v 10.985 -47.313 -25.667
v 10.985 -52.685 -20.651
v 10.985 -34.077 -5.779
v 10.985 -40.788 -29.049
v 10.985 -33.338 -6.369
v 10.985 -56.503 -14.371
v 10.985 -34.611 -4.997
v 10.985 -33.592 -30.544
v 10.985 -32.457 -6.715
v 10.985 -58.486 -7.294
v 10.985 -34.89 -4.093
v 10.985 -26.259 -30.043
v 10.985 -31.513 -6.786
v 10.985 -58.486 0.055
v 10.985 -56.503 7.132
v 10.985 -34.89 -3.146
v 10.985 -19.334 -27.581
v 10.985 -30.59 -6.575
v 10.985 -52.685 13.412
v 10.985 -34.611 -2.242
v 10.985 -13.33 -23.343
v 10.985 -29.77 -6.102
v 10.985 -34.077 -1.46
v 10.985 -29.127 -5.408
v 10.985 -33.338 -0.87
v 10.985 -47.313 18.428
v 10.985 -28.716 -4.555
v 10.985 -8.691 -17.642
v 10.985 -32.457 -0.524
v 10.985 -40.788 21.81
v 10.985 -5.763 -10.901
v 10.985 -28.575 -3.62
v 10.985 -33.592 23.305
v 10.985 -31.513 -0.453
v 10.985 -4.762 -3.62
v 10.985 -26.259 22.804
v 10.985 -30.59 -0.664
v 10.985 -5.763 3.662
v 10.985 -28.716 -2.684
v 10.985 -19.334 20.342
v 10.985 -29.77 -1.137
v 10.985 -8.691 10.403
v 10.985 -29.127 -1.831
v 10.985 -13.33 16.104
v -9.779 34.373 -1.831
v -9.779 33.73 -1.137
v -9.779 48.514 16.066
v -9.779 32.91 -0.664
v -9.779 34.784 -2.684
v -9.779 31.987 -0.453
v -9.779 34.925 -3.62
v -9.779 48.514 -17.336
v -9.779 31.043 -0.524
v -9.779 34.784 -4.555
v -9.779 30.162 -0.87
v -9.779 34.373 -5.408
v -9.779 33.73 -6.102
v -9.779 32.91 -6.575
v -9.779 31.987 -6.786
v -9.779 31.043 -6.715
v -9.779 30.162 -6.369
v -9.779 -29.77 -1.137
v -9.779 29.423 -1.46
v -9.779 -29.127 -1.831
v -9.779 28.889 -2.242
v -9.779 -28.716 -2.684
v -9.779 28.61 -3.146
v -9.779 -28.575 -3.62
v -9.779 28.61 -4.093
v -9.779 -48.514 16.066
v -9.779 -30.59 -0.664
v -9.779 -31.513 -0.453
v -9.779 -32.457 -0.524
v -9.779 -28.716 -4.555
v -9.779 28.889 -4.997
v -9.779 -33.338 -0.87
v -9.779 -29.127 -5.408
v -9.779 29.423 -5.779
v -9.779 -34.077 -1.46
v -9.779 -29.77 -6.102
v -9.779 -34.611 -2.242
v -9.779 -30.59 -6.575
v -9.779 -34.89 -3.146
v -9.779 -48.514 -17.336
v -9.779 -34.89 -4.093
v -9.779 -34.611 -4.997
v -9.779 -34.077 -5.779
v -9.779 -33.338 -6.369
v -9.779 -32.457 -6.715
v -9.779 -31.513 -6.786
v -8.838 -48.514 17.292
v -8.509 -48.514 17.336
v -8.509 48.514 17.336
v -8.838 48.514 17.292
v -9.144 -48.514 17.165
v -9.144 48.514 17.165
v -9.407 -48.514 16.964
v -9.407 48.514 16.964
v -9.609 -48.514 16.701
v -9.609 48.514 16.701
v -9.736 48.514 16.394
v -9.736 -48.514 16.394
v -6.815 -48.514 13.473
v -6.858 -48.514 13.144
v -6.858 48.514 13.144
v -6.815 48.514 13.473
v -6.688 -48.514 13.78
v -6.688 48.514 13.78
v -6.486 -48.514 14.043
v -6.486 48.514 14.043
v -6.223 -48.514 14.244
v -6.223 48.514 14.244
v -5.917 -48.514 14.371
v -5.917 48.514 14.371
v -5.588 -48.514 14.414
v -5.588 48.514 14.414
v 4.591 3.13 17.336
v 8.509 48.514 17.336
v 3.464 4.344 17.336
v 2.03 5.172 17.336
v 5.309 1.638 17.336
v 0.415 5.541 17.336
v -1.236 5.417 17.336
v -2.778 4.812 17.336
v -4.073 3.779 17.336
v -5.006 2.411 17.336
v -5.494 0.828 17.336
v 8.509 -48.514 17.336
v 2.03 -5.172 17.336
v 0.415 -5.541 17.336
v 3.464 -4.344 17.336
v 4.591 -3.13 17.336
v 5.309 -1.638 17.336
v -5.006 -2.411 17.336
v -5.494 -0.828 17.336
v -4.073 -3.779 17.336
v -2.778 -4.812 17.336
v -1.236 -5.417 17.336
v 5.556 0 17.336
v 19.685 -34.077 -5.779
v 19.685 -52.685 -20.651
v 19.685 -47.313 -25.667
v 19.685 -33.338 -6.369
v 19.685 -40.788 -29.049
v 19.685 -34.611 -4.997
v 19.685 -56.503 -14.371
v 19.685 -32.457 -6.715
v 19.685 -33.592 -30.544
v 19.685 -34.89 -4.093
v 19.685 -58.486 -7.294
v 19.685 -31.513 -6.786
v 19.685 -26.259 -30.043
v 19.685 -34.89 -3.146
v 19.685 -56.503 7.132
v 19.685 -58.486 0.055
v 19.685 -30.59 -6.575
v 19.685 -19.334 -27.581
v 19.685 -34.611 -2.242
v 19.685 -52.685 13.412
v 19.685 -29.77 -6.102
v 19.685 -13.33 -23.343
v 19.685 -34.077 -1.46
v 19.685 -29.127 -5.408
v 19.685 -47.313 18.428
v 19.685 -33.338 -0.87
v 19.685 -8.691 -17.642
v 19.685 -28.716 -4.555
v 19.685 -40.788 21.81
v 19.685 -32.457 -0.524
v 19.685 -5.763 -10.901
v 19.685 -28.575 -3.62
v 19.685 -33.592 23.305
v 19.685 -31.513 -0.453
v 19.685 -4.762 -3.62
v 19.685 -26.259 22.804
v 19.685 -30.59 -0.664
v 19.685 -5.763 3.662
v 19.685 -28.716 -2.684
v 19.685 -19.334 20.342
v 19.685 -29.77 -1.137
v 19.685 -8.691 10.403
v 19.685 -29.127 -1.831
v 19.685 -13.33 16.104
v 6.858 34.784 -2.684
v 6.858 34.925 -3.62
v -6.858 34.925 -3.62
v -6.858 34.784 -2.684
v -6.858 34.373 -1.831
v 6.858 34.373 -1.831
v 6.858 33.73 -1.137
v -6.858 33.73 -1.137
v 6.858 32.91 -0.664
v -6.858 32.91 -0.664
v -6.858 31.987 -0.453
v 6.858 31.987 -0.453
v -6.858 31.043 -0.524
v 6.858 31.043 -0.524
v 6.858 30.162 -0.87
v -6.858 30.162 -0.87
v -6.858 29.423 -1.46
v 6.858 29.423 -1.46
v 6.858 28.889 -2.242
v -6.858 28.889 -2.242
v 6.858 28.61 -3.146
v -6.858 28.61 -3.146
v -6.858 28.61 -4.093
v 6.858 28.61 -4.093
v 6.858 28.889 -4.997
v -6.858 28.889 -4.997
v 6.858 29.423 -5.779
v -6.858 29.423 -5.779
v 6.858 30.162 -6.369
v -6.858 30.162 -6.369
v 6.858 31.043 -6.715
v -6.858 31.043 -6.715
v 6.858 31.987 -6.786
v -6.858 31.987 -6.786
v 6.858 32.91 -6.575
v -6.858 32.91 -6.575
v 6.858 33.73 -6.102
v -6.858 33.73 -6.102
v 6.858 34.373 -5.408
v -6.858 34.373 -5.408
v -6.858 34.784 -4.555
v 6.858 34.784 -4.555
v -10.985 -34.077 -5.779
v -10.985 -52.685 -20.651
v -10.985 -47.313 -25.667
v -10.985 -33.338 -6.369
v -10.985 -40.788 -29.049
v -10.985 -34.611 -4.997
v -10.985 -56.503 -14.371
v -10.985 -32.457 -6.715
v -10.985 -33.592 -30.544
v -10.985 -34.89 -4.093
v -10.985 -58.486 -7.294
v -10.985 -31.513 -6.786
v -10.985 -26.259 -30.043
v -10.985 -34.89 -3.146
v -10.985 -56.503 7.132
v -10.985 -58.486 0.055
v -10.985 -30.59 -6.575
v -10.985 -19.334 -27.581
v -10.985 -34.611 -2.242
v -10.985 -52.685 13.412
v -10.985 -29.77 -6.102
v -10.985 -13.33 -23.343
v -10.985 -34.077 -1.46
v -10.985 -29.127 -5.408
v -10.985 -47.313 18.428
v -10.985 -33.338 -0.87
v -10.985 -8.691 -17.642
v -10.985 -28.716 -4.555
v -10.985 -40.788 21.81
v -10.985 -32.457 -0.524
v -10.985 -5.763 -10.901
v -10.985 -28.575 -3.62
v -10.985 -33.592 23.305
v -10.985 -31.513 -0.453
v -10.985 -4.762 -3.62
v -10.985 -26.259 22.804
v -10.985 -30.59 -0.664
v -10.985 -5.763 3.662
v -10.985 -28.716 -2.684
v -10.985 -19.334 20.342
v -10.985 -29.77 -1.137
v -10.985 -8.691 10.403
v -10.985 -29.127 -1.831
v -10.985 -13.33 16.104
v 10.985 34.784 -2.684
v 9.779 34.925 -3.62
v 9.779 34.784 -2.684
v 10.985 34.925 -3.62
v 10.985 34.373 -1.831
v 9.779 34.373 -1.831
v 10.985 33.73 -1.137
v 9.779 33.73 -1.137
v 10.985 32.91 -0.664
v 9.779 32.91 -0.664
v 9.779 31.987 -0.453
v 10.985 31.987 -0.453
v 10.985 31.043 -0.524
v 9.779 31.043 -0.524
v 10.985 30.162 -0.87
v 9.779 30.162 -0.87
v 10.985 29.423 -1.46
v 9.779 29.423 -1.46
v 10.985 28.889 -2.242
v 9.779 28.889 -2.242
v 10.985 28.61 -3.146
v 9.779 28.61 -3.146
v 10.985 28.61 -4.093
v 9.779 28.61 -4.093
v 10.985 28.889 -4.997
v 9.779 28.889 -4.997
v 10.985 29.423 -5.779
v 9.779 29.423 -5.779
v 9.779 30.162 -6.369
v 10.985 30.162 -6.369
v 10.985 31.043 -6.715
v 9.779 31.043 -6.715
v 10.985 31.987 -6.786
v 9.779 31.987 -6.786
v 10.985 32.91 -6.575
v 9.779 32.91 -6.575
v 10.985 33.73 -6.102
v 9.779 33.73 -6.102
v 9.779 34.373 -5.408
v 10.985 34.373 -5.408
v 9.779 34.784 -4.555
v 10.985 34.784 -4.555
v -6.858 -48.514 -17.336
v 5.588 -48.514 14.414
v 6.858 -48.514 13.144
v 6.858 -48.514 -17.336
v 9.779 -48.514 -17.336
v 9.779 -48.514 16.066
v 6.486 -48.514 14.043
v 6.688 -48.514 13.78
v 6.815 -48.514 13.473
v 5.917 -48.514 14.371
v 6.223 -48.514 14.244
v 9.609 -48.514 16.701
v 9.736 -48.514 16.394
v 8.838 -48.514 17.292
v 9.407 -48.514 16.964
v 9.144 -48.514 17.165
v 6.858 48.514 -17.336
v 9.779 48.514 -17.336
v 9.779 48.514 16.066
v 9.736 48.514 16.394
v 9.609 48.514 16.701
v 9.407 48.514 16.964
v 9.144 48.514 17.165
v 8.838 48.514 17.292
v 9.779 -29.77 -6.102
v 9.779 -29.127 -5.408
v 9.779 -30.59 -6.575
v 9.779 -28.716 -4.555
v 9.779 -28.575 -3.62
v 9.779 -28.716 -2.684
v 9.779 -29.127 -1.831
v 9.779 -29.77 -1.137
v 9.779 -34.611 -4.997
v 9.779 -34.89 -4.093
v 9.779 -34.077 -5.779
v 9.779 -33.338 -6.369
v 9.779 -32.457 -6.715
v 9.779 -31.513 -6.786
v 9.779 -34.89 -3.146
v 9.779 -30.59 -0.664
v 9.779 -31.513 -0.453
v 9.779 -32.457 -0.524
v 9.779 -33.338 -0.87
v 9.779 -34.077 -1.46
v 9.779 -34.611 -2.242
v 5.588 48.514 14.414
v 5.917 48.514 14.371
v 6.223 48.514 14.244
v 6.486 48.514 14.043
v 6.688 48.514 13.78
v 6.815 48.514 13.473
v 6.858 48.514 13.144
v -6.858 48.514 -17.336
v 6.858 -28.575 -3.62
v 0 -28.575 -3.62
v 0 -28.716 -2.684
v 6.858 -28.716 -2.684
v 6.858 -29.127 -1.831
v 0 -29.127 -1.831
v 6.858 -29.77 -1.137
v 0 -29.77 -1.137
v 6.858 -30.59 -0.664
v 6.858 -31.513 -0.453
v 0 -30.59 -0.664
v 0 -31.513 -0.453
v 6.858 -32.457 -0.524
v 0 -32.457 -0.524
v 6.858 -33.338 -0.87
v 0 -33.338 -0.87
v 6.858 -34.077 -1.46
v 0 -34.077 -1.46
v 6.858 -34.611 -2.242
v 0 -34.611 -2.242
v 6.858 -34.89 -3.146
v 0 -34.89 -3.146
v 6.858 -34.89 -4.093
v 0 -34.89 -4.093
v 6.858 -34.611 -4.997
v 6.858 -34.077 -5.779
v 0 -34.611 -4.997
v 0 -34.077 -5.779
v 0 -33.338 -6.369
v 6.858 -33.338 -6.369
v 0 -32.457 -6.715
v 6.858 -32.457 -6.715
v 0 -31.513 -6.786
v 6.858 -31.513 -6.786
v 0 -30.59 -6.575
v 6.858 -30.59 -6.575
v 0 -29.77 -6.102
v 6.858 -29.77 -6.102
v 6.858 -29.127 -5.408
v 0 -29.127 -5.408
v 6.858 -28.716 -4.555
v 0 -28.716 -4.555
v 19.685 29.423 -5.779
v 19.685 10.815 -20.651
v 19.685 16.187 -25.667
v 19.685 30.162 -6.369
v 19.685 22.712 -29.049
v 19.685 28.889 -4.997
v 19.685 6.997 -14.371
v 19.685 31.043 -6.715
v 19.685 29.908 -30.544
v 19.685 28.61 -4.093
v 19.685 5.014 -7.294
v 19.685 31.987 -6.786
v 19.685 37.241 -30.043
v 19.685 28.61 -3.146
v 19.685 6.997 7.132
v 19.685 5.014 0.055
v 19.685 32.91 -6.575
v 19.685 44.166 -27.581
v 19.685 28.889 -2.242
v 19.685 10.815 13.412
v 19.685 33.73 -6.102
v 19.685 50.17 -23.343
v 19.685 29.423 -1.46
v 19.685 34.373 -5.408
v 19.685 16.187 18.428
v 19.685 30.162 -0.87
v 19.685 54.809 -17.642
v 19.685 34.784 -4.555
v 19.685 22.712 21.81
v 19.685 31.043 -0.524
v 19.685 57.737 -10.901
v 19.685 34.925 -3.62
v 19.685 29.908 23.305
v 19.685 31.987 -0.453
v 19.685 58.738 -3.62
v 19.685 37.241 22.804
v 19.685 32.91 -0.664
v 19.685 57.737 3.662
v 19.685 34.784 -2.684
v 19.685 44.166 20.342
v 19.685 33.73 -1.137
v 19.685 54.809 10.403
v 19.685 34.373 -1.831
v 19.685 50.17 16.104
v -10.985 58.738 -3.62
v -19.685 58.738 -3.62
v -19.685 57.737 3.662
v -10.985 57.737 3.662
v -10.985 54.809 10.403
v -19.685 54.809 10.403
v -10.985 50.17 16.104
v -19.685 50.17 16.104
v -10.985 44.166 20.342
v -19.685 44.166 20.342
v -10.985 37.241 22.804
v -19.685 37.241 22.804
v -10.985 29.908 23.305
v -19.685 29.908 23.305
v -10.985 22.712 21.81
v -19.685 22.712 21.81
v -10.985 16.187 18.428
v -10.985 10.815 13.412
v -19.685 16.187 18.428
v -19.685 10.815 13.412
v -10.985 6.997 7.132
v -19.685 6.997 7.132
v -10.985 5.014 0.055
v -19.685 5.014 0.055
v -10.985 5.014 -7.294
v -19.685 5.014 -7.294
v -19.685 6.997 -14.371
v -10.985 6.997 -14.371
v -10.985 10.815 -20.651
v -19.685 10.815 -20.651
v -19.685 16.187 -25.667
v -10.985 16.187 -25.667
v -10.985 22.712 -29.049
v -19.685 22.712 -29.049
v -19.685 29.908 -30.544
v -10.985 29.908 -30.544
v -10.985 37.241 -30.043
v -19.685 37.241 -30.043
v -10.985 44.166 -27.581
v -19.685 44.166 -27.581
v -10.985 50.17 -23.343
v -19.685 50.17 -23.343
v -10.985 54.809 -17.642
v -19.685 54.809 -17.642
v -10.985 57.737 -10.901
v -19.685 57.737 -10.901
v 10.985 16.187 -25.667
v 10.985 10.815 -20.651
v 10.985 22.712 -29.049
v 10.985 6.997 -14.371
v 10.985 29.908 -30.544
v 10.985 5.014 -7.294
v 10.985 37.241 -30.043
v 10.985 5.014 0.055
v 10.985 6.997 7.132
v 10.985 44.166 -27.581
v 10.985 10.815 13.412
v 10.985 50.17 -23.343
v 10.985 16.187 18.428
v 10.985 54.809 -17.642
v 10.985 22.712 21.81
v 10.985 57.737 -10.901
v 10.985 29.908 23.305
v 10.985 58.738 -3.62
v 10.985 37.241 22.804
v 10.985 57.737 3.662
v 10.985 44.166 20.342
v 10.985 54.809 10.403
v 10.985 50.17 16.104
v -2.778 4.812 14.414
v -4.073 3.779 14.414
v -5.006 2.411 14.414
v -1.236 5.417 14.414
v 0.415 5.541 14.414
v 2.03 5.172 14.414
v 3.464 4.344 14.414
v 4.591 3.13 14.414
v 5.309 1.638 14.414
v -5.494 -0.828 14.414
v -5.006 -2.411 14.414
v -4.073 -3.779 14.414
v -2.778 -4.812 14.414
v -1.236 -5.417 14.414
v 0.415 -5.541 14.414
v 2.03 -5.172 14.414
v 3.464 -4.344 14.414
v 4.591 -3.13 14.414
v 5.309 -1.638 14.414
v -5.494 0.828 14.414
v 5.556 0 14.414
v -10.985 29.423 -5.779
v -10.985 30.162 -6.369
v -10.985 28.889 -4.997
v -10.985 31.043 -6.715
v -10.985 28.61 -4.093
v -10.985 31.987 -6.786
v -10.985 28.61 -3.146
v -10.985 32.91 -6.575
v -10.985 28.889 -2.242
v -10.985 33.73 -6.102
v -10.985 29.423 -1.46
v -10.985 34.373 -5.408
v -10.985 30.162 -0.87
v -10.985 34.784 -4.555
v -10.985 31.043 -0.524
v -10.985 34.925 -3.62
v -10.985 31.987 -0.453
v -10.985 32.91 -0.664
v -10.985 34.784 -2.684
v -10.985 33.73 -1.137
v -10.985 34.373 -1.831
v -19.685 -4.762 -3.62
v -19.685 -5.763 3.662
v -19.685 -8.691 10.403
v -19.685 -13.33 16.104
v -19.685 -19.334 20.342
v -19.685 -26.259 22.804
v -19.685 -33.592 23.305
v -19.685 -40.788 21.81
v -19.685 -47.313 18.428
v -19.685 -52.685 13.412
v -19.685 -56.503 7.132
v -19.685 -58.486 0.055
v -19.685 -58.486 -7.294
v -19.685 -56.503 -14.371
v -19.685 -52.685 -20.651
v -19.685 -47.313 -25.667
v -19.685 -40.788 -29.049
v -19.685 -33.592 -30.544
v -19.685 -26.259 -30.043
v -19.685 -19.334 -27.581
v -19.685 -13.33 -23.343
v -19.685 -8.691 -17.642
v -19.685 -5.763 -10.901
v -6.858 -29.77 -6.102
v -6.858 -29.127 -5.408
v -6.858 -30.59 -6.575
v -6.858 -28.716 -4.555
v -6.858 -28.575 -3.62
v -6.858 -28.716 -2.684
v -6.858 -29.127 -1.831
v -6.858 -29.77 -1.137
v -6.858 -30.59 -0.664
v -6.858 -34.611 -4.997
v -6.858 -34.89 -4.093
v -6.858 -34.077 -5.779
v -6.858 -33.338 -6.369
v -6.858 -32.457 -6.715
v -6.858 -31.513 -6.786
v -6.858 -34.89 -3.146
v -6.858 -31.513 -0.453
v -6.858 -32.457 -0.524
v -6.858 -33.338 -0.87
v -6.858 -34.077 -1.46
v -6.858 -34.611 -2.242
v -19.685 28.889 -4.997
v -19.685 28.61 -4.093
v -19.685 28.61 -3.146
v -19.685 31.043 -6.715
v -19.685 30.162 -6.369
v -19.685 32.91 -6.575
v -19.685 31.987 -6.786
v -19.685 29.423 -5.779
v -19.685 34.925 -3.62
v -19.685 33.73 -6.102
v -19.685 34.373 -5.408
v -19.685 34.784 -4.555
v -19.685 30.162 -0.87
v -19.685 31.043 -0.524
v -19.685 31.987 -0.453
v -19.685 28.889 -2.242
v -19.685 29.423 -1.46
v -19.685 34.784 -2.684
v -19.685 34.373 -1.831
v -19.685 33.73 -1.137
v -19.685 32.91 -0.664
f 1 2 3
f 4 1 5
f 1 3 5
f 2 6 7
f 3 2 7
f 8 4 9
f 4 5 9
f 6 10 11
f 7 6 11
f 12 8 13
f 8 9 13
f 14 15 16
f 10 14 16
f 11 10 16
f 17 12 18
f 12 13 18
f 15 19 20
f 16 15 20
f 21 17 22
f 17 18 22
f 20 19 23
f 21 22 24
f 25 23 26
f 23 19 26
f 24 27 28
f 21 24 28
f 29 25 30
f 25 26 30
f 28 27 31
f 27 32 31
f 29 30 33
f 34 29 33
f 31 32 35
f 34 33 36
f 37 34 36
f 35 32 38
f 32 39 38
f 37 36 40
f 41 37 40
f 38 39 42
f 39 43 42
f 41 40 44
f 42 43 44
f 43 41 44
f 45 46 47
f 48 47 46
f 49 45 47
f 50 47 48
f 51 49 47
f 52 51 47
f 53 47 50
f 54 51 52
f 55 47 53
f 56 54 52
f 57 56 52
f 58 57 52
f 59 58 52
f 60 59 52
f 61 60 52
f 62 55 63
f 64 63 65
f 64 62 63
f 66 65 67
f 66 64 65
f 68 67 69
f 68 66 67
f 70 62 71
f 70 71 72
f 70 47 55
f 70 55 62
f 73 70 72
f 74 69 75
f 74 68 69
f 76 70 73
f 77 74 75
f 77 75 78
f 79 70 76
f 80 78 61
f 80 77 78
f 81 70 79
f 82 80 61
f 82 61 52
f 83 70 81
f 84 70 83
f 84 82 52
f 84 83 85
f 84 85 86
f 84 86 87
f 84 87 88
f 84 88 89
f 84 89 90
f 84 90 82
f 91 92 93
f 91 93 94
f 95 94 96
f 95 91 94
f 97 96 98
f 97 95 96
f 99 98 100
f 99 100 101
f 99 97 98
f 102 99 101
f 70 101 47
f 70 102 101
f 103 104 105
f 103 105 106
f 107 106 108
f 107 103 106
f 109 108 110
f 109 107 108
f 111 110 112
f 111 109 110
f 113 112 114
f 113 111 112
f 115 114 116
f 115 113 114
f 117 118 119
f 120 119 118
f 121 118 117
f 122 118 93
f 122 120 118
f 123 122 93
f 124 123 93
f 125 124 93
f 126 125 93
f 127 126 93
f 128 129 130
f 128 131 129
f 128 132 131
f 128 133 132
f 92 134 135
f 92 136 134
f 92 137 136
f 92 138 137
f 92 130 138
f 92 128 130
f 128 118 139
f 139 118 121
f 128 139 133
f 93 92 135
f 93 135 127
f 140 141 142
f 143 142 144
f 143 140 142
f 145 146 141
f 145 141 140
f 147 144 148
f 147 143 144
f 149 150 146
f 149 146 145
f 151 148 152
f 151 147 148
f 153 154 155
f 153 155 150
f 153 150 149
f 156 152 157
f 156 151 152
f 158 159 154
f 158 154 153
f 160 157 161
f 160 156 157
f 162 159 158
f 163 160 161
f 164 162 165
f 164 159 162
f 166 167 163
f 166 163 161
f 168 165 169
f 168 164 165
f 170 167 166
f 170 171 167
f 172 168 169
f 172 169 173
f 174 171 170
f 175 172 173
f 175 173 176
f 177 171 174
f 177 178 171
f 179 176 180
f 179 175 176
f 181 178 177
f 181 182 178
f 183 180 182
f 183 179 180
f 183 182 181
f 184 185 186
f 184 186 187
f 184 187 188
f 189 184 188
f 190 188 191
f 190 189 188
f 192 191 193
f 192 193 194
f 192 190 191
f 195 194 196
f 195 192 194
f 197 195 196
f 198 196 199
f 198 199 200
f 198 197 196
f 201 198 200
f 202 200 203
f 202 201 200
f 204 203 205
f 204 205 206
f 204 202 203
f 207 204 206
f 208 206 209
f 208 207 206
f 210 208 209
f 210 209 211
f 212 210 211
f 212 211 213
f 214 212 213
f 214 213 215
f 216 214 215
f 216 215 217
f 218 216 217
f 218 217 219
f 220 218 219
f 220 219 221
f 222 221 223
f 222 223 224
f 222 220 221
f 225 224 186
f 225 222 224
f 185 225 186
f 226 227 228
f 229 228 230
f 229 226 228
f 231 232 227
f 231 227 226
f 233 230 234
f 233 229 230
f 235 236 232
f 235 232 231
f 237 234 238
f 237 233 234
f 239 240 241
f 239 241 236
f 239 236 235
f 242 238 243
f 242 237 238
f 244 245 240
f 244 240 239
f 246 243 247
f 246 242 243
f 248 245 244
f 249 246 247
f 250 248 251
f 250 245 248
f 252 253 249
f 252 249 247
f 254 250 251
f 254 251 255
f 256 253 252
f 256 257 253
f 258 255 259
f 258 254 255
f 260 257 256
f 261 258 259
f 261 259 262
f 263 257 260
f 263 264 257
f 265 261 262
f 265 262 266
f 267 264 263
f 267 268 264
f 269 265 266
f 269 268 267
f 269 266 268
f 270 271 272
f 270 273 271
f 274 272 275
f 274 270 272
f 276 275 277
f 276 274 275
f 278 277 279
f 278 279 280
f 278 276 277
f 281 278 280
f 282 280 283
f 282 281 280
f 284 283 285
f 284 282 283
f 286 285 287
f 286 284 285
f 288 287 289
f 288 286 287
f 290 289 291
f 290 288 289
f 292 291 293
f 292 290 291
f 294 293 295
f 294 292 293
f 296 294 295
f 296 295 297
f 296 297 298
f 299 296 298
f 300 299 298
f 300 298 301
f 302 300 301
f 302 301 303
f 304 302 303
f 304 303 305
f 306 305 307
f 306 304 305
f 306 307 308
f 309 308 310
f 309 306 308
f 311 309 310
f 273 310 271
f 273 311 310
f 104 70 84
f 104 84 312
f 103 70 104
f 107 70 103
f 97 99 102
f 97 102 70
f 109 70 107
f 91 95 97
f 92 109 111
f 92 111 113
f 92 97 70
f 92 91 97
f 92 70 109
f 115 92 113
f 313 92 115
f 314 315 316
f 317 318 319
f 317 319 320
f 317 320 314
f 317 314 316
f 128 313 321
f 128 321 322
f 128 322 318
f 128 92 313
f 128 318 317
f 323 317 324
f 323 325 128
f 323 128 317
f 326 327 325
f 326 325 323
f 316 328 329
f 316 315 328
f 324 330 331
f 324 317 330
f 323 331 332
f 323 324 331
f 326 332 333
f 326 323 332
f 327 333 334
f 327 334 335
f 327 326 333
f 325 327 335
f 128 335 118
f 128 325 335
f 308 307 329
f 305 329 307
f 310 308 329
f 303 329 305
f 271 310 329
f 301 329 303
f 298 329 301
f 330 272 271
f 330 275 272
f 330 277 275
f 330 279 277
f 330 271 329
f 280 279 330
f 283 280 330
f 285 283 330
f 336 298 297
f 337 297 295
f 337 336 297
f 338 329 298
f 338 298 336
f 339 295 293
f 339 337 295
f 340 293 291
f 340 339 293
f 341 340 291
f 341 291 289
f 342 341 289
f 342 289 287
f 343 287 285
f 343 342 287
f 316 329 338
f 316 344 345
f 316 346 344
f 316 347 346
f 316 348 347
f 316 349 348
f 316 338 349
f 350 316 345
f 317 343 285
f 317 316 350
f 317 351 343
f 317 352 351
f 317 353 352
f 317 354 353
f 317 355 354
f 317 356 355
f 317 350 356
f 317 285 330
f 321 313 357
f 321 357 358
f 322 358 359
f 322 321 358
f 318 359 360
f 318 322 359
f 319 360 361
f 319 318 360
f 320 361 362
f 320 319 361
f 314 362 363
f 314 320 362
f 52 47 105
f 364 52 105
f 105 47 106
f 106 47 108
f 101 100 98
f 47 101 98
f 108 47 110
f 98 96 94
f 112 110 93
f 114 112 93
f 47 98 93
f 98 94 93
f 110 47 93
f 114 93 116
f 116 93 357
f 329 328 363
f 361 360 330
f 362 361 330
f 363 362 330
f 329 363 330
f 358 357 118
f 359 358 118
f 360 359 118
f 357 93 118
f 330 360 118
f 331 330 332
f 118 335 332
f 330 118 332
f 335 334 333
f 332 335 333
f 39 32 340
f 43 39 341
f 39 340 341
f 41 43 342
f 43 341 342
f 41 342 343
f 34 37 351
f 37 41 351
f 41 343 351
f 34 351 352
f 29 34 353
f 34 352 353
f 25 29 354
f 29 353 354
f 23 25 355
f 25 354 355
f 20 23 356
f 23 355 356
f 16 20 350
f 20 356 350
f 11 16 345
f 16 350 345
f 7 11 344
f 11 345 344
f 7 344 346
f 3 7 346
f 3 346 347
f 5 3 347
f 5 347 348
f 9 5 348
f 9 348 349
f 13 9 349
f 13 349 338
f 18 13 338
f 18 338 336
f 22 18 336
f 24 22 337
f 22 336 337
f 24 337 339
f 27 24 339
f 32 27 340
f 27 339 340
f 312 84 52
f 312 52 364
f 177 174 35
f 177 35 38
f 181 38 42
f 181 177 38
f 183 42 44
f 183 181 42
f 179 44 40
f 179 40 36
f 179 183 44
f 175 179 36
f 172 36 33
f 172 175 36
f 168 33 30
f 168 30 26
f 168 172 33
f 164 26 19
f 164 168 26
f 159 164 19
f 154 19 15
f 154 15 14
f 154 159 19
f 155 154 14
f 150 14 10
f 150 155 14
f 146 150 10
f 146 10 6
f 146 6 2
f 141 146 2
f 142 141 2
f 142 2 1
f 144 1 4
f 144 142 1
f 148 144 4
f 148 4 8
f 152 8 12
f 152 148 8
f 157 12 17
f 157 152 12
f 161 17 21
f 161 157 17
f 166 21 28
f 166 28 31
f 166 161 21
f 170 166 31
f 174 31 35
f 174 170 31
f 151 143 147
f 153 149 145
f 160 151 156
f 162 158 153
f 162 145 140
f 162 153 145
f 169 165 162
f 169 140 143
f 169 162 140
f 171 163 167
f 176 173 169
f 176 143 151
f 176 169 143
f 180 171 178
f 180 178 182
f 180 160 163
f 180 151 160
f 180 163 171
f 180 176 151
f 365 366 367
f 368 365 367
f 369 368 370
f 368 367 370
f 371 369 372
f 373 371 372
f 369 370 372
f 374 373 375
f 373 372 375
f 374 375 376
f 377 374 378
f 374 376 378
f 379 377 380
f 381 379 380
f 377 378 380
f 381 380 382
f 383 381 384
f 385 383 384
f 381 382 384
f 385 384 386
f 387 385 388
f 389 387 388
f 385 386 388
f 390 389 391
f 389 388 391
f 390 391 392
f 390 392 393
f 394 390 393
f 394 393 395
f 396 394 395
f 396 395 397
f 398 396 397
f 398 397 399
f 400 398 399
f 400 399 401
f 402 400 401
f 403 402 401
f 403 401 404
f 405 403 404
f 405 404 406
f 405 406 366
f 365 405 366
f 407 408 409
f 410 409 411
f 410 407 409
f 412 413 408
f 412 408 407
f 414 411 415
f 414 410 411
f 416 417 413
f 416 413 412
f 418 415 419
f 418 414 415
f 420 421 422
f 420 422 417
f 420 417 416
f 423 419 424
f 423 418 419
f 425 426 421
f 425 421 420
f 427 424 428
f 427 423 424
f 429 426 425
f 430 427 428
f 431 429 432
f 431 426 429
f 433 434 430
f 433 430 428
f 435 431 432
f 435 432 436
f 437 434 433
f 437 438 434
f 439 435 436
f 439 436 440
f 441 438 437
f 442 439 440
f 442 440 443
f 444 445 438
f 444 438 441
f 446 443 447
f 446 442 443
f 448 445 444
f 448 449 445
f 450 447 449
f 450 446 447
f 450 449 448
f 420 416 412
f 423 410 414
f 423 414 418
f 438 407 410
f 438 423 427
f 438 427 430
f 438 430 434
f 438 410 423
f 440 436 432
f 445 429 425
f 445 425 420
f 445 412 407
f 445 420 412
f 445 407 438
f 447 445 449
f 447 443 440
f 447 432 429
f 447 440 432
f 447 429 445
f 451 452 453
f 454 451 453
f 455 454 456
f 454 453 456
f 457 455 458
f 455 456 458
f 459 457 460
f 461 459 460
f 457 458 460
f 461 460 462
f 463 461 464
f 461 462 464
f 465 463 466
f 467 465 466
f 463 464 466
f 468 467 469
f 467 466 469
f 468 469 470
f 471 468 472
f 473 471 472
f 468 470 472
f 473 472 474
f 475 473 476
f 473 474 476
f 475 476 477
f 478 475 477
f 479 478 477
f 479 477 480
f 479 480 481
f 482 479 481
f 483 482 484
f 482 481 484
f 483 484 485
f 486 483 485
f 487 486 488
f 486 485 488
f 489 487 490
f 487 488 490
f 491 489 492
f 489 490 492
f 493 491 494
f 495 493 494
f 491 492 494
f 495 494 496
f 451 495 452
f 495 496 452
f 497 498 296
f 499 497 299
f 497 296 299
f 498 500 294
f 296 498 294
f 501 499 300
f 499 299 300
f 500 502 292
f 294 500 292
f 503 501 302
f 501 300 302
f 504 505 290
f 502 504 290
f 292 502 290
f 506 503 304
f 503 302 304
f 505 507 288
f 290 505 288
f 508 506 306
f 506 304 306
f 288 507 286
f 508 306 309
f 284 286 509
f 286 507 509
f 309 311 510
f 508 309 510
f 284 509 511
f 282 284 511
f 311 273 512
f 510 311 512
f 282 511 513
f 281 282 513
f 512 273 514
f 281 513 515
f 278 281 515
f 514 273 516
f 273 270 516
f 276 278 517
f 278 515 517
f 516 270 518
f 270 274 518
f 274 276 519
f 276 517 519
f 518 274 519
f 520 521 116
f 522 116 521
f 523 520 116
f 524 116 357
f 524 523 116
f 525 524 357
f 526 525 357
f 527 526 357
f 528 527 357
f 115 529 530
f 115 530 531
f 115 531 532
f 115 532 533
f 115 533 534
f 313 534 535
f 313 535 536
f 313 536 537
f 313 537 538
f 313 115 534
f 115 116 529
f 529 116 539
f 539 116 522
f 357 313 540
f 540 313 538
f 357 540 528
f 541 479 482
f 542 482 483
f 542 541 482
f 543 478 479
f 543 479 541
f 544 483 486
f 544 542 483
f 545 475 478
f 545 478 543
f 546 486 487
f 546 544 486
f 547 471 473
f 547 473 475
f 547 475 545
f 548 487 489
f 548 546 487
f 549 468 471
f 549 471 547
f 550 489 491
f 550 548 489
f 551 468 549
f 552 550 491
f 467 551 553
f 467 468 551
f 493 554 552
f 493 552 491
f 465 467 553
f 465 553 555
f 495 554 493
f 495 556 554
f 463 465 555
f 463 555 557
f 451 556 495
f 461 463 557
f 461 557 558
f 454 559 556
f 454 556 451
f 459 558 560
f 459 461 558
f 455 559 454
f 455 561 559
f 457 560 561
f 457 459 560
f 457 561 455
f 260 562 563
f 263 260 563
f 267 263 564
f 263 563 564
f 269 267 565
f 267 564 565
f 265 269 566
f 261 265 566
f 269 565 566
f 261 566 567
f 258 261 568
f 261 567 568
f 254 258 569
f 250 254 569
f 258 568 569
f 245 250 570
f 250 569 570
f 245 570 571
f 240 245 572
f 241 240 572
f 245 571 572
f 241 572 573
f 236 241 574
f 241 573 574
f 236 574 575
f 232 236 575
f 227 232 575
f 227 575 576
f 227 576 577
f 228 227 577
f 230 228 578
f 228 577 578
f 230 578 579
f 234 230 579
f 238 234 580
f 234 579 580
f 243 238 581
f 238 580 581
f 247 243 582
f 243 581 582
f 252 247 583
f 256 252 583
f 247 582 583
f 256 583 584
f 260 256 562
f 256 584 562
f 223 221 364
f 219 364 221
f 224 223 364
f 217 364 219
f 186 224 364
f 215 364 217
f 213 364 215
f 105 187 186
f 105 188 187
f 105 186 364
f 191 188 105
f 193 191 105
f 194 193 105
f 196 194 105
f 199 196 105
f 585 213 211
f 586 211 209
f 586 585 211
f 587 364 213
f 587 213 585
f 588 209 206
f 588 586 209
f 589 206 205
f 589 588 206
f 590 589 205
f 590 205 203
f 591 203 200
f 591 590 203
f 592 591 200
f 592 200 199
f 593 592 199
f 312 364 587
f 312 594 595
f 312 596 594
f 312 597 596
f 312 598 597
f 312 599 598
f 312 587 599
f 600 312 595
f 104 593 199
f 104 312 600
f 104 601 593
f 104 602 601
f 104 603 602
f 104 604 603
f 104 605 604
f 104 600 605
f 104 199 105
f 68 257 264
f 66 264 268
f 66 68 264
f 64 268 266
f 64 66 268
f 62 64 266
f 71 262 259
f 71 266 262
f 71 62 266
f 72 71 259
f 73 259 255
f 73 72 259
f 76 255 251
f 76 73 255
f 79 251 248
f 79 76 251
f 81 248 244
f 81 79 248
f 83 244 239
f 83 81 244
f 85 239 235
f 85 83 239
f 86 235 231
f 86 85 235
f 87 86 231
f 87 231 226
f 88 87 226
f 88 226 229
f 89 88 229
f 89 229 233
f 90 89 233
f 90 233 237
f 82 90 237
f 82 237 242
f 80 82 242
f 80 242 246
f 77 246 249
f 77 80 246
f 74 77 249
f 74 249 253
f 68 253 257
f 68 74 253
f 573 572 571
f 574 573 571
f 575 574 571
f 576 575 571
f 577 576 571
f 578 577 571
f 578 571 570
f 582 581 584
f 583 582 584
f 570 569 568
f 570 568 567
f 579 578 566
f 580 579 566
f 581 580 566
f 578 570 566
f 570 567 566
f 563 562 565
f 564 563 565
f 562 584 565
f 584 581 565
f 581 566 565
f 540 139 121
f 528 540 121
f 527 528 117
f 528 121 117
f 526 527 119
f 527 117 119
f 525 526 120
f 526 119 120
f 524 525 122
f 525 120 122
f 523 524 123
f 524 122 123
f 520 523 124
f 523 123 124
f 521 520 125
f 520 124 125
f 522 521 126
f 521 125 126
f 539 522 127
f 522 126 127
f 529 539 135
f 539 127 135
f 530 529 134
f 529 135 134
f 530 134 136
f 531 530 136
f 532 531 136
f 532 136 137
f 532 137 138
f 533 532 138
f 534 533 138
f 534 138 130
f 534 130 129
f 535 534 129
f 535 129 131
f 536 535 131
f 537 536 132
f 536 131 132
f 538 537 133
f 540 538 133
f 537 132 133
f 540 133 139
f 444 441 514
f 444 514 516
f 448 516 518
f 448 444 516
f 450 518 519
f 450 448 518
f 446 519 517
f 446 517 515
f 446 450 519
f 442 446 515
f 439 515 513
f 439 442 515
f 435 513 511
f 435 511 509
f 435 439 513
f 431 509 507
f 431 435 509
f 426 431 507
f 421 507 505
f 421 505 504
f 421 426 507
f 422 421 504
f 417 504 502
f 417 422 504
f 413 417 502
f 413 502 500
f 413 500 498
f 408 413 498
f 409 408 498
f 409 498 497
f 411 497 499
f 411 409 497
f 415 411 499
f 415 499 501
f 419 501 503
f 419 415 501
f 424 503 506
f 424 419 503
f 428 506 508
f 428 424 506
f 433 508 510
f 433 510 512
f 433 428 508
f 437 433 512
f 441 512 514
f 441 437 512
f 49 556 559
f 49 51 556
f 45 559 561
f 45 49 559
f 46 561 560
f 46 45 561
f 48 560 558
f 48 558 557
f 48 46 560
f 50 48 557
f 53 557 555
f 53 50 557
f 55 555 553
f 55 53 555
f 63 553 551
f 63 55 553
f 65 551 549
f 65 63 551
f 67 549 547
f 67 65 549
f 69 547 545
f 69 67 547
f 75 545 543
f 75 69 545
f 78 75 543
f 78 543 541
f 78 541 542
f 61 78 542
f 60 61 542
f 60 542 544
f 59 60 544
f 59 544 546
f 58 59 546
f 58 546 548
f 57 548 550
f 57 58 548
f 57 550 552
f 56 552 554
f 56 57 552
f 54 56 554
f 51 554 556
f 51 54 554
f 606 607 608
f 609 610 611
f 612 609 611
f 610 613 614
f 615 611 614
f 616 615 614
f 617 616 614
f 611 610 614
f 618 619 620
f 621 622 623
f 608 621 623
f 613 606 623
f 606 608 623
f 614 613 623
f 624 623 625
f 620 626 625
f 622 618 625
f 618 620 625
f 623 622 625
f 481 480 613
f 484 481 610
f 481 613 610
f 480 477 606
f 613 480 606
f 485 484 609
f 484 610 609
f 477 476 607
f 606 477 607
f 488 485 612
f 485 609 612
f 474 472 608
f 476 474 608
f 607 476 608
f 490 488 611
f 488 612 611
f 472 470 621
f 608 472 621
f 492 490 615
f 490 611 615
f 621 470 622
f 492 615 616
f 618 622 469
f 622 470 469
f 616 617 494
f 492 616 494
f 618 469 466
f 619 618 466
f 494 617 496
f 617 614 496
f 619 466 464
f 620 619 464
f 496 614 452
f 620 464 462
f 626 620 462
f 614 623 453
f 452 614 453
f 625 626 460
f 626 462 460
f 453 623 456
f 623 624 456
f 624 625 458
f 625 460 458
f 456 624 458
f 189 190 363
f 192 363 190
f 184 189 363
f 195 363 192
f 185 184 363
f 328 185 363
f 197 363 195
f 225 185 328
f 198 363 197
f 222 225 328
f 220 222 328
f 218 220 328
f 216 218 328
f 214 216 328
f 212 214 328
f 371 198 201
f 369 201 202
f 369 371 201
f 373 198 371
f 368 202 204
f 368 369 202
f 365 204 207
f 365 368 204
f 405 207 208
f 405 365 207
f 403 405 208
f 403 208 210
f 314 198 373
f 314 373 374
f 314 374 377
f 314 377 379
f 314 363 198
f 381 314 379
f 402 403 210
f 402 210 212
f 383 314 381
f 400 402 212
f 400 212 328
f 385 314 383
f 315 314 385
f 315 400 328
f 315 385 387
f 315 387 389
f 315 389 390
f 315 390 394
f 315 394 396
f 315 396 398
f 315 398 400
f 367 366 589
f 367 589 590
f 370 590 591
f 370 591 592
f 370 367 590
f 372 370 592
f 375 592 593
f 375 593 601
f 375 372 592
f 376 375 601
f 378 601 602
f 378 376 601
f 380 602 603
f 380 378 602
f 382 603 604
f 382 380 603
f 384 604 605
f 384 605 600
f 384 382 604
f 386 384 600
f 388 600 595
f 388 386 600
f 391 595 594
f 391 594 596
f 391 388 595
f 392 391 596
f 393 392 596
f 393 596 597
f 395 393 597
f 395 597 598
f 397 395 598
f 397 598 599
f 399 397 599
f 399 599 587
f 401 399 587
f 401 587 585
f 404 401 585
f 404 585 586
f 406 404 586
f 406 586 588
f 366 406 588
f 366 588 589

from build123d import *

# Parameters (mm, degrees)
F1_DEPTH  = 48.514
F2_R      = 3.175
F3_DEPTH  = 19.558
F4_R      = 3.175
F5_DEPTH  = 19.685
F6_R      = 26.9875
F7_DEPTH  = 8.6995
F9_R      = 5.55625
F10_DEPTH = 2.921


with BuildPart() as f1:
    # F0 (on Front) → F1 (new body, symmetric)
    with BuildSketch(Plane.XZ):
        with BuildLine():
            ThreePointArc((9.779, 16.0655), (9.407026, 16.963526), (8.509, 17.3355))
            Line((8.509, 17.3355), (-8.509, 17.3355))
            ThreePointArc((-8.509, 17.3355), (-9.407026, 16.963526), (-9.779, 16.0655))
            Line((-9.779, 16.0655), (-9.779, -17.3355))
            Line((-9.779, -17.3355), (-6.858, -17.3355))
            Line((-6.858, -17.3355), (-6.858, 13.1445))
            ThreePointArc((-6.858, 13.1445), (-6.486026, 14.042526), (-5.588, 14.4145))
            Line((-5.588, 14.4145), (5.588, 14.4145))
            ThreePointArc((5.588, 14.4145), (6.486026, 14.042526), (6.858, 13.1445))
            Line((6.858, 13.1445), (6.858, -17.3355))
            Line((6.858, -17.3355), (9.779, -17.3355))
            Line((9.779, -17.3355), (9.779, 16.0655))
        make_face()
    extrude(amount=F1_DEPTH, both=True)

    # F2 (on face) → F3 (cut, through all)
    with BuildSketch(Plane.YZ.offset(9.779)):
        with Locations((-31.75, -3.6195)):
            Circle(F2_R)
        with Locations((31.75, -3.6195)):
            Circle(F2_R)
    extrude(amount=-F3_DEPTH, mode=Mode.SUBTRACT)

    # F4 (on Right) → F5 (join, symmetric)
    with BuildSketch(Plane.YZ):
        with Locations((-31.75, -3.6195)):
            Circle(F4_R)
        with Locations((31.75, -3.6195)):
            Circle(F4_R)
    extrude(amount=F5_DEPTH, both=True)

    # F6 (on face) → F7 (join)
    with BuildSketch(Plane.YZ.offset(19.685)):
        with Locations((-31.75, -3.6195)):
            Circle(F6_R)
        with Locations((31.75, -3.6195)):
            Circle(F6_R)
    extrude(amount=-F7_DEPTH)

    # F8: F1 across plane


with BuildPart() as f1_1:
    add(f1.part)
    add(f1.part.mirror(Plane.YZ))

    # F9 (on face) → F10 (cut, through all)
    with BuildSketch(Plane.XY.offset(17.3355)):
        Circle(F9_R)
    extrude(amount=-F10_DEPTH, mode=Mode.SUBTRACT)


solid = f1_1.part
